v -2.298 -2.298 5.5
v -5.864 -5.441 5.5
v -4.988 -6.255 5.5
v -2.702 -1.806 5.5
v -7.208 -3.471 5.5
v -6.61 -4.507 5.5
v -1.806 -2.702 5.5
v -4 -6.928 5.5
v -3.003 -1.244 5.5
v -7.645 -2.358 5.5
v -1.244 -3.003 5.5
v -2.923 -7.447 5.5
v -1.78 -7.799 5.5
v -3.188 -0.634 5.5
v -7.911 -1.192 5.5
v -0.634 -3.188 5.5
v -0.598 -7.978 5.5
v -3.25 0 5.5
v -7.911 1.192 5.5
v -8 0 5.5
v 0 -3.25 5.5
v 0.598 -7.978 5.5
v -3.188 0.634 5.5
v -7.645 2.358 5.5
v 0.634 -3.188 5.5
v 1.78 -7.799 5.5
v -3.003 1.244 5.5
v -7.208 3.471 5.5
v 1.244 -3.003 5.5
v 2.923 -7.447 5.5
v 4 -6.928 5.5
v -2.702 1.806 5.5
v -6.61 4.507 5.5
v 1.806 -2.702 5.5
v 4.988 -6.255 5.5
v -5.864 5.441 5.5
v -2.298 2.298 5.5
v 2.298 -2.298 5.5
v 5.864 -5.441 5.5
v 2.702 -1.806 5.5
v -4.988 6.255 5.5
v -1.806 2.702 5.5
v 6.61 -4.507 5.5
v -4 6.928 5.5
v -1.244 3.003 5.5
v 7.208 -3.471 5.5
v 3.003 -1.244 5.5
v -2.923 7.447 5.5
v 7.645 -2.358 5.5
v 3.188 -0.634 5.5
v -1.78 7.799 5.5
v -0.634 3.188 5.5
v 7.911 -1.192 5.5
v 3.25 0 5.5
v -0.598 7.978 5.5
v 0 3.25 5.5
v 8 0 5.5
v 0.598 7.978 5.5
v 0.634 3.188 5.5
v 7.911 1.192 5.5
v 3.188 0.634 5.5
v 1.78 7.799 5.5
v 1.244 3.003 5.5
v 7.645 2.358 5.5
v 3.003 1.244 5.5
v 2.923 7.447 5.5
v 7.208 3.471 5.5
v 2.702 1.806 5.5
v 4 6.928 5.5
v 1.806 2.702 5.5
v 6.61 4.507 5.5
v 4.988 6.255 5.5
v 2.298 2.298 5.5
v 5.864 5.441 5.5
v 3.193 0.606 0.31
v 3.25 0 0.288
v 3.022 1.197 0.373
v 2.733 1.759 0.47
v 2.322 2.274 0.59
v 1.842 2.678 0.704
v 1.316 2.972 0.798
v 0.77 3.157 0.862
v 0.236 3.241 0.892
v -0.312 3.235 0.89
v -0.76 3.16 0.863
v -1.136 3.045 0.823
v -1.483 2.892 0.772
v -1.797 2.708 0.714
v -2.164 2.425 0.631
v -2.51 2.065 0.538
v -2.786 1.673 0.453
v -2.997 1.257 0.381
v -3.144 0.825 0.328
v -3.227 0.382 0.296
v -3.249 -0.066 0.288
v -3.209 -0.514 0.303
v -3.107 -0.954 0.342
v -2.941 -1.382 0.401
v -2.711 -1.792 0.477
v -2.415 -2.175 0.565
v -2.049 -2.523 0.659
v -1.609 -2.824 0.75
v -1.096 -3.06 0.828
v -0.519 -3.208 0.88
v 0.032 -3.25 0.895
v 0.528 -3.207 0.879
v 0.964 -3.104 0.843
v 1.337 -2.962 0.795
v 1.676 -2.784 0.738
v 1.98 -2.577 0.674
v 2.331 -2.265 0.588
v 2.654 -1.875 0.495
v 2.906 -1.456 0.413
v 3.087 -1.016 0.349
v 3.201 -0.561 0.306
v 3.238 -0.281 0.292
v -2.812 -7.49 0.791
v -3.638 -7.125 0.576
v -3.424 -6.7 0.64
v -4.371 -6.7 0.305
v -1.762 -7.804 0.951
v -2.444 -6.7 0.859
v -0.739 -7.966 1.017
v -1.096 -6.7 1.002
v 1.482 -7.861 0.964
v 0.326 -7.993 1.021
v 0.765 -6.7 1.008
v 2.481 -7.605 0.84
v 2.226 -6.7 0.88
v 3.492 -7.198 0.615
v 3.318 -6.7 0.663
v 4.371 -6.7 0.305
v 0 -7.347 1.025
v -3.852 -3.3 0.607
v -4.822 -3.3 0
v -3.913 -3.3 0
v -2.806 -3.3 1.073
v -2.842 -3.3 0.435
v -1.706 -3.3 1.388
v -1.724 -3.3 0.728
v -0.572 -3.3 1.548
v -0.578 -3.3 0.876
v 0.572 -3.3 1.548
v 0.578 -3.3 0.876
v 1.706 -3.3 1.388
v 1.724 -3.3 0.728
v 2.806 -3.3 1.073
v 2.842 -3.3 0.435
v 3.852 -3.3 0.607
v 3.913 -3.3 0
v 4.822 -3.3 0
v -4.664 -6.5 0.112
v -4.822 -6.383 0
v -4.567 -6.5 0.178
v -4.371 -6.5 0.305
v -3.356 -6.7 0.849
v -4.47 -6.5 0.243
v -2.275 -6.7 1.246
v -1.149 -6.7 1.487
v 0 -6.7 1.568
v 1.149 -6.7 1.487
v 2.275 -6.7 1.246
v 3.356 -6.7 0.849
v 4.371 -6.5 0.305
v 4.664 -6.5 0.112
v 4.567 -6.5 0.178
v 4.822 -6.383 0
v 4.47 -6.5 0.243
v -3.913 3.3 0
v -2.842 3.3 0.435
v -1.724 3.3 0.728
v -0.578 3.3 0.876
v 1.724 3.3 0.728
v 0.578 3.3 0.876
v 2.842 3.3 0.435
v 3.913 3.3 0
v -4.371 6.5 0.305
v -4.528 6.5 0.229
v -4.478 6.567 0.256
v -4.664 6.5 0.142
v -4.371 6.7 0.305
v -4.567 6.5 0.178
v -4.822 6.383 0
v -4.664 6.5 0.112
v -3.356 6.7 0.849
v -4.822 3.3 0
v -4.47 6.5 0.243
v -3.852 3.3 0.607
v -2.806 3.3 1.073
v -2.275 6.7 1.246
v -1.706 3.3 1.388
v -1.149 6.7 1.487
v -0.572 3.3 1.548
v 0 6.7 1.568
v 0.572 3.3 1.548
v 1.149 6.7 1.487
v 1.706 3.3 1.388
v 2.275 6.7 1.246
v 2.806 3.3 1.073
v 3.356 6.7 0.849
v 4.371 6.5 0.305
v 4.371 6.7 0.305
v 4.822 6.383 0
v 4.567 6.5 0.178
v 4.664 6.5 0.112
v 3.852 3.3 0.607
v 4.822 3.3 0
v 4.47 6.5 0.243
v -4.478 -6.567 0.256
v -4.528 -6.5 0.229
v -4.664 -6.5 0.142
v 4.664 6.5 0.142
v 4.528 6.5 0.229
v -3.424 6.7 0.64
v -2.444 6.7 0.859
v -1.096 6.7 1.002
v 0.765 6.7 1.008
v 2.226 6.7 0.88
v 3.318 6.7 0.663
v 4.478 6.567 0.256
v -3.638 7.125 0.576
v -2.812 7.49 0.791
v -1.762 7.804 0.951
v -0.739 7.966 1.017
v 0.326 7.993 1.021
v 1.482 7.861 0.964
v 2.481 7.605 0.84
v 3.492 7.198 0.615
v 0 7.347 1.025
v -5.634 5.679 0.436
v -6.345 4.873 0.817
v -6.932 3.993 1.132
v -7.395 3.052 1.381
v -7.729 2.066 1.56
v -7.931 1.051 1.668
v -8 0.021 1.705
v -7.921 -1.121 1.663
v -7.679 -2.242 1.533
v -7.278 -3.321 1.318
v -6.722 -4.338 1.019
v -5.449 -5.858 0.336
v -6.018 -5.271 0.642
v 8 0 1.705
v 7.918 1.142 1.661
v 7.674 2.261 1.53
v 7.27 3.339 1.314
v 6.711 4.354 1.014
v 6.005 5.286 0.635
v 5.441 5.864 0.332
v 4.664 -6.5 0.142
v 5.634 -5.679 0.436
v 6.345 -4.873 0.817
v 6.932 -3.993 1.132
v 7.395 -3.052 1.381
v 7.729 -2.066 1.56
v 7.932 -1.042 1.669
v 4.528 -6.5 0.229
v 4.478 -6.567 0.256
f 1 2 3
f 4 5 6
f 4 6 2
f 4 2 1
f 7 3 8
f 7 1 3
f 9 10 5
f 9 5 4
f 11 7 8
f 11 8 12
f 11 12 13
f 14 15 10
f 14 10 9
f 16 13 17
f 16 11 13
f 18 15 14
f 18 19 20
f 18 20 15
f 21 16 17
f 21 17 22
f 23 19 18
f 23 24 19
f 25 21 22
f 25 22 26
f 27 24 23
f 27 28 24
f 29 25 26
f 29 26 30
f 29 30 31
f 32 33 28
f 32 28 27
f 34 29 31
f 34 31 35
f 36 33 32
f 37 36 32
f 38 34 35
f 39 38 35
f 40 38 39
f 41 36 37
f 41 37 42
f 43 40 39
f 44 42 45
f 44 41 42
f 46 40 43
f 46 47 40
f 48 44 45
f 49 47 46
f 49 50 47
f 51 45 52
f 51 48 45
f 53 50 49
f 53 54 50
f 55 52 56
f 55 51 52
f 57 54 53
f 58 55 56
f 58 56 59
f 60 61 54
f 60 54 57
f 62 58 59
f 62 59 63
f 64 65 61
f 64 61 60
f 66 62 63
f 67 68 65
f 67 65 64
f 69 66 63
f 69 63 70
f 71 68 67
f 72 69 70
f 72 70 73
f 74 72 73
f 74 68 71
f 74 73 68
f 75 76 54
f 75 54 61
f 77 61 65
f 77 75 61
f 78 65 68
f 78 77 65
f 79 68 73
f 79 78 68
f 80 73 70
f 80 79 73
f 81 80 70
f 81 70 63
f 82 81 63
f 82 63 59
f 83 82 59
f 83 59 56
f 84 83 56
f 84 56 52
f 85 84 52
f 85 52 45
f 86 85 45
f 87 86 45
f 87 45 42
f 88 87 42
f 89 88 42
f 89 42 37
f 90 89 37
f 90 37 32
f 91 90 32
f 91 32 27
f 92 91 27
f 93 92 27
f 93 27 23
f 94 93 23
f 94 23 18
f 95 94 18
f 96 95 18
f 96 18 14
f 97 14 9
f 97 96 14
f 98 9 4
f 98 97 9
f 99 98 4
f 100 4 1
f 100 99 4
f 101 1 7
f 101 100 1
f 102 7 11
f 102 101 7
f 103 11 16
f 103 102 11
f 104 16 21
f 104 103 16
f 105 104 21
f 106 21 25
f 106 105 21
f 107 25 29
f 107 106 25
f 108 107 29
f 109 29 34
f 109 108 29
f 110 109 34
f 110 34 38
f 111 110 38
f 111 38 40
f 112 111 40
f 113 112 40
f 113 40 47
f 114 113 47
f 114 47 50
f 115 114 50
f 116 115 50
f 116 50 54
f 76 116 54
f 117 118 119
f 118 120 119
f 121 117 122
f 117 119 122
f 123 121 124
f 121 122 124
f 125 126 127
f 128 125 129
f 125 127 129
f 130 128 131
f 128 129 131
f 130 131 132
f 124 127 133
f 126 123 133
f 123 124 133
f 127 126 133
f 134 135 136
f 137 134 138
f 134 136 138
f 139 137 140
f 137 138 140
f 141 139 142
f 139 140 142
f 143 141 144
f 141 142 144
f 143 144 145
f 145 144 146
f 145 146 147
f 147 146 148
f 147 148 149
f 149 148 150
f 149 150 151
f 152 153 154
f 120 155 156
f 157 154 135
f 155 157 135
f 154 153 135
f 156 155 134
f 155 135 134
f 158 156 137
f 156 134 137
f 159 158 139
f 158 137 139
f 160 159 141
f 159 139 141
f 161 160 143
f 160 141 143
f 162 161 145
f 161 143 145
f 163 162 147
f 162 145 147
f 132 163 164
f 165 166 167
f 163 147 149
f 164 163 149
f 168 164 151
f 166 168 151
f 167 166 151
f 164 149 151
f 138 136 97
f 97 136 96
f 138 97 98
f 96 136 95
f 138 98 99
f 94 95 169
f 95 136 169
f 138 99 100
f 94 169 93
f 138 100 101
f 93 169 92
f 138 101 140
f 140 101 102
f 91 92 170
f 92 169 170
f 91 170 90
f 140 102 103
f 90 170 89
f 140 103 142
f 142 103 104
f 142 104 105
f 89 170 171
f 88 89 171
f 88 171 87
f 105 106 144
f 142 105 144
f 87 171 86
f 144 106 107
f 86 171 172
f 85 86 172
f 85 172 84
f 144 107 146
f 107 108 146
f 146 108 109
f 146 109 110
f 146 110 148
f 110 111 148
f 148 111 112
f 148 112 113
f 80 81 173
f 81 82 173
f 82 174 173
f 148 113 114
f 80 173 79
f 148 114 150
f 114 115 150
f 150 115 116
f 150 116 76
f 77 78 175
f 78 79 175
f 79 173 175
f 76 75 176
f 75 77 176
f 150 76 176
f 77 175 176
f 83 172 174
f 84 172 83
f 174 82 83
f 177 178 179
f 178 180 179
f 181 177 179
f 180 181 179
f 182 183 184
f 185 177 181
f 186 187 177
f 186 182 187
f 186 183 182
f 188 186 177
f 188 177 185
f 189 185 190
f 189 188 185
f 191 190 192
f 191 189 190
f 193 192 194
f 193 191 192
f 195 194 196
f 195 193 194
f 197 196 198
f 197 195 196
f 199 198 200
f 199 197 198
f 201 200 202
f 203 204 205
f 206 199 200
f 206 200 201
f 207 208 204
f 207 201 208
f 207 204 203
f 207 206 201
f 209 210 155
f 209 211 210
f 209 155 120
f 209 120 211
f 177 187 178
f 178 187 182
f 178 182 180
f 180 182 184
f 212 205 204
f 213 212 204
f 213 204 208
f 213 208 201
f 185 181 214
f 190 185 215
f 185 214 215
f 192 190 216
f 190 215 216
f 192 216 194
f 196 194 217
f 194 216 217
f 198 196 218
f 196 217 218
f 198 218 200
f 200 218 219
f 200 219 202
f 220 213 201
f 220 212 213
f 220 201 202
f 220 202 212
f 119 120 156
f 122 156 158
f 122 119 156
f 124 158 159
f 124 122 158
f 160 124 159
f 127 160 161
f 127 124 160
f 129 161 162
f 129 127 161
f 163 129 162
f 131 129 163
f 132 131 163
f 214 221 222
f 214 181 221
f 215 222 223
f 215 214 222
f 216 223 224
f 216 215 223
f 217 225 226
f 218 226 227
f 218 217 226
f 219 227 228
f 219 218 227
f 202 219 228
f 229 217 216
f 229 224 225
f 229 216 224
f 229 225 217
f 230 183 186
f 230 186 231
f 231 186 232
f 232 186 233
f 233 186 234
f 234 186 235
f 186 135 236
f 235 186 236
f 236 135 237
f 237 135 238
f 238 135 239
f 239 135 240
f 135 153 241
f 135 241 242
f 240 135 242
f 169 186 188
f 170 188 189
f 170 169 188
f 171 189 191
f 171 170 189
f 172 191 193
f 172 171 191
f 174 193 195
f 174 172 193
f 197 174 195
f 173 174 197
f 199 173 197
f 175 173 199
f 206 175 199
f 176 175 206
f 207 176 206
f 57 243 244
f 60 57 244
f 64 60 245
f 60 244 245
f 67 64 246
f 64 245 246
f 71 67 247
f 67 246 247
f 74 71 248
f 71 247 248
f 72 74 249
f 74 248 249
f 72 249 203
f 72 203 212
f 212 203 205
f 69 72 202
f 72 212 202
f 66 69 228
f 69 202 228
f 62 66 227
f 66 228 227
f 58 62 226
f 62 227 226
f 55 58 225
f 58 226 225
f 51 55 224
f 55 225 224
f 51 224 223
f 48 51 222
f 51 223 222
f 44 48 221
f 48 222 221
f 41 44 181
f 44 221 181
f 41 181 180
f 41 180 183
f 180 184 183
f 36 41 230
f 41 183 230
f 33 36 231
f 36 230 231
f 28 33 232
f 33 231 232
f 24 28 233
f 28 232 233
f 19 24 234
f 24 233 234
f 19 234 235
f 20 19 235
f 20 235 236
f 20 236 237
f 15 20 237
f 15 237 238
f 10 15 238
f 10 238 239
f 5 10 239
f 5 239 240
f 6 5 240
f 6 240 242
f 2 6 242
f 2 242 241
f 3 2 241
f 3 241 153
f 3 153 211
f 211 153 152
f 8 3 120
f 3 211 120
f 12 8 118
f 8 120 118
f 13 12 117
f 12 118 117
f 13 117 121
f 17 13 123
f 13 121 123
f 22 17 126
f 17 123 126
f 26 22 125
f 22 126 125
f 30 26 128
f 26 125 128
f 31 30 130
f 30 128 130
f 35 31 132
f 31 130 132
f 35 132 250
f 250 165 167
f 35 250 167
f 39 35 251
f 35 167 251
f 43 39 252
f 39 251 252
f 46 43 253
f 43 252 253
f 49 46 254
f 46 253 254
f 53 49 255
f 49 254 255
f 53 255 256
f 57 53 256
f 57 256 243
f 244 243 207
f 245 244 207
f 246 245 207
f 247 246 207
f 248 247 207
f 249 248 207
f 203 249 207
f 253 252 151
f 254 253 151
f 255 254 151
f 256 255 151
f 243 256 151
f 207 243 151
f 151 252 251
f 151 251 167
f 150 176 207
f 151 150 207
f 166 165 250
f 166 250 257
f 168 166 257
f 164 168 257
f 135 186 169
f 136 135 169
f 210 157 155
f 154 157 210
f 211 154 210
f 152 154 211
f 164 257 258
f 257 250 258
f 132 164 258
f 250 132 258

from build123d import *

# Parameters (mm, degrees)
CROQUIS1_R                 = 8
CROQUIS1_R_2               = 3.25
SALIENTE_EXTRUIR1_DEPTH    = 5.5
CORTAR_EXTRUIR1_START      = -3.2
CROQUIS3_R                 = 8.2
CORTAR_EXTRUIR1_DEPTH      = 3.4
CORTAR_EXTRUIR2_DEPTH      = 3.4
CORTAR_EXTRUIR3_REACH      = 16.898
CROQUIS5_R                 = 9
CORTAR_EXTRUIR4_DEPTH      = 13.579745796
CORTAR_EXTRUIR4_DEPTH_BACK = 13.579745796


with BuildPart() as part:
    # Croquis1 → Saliente-Extruir1 (new body)
    with BuildSketch(Plane.XY):
        Circle(CROQUIS1_R)
        Circle(CROQUIS1_R_2, mode=Mode.SUBTRACT)
    extrude(amount=SALIENTE_EXTRUIR1_DEPTH)

    # Croquis3 → Cortar-Extruir1 (cut)
    with BuildSketch(Plane(origin=(0, 6.5, 0), x_dir=(1, 0, 0), z_dir=(0, 1, 0)).offset(CORTAR_EXTRUIR1_START)):
        with Locations((0, 6.632138172)):
            Circle(CROQUIS3_R)
    cortar_extruir1 = extrude(amount=CORTAR_EXTRUIR1_DEPTH, mode=Mode.SUBTRACT)

    # Croquis4 → Cortar-Extruir2 (cut)
    with BuildSketch(Plane(origin=(0, 6.5, 0), x_dir=(1, 0, 0), z_dir=(0, 1, 0))):
        with BuildLine():
            Line((-4.82231721, 1.547107411), (4.82231721, 1.547107411))
            add(Edge.make_bspline(
                [(4.371498599, -0.305440656), (5.098983206, 0.005932333), (5.249256077, 0.623448355), (4.82231721, 1.547107411)],
                knots=[0, 0, 0, 0, 1, 1, 1, 1], degree=3))
            add(Edge.make_bspline(
                [(-4.371498599, -0.305440656), (-2.961142952, -0.90909144), (-0.0365681, -1.156703774), (3.034279152, -0.877788184), (4.371498599, -0.305440656)],
                knots=[0, 0, 0, 0, 0.5, 1, 1, 1, 1], degree=3))
            add(Edge.make_bspline(
                [(-4.371498599, -0.305440656), (-5.098983206, 0.005932333), (-5.249256077, 0.623448355), (-4.82231721, 1.547107411)],
                knots=[0, 0, 0, 0, 1, 1, 1, 1], degree=3))
        make_face()
    cortar_extruir2 = extrude(amount=CORTAR_EXTRUIR2_DEPTH, mode=Mode.SUBTRACT)

    # Simetría1: Cortar-Extruir1, Cortar-Extruir2 across plane
    add(cortar_extruir1.mirror(Plane.ZX), mode=Mode.SUBTRACT)
    add(cortar_extruir2.mirror(Plane.ZX), mode=Mode.SUBTRACT)

    # Cortar-Extruir3: up to this face of the body (flat: up to its plane)
    cortar_extruir3_end = Plane(part.part.faces().sort_by_distance((0, -3.3, 0.632585689))[0])
    # Croquis5 → Cortar-Extruir3 (cut, up to the picked face)
    with BuildSketch(Plane(origin=(0, 3.3, 0), x_dir=(1, 0, 0), z_dir=(0, 1, 0)), mode=Mode.PRIVATE) as cortar_extruir3_sk1:
        with Locations((0, 8.105012001)):
            Circle(CROQUIS5_R)
    cortar_extruir3_tool1 = split(extrude(cortar_extruir3_sk1.sketch, amount=-CORTAR_EXTRUIR3_REACH, mode=Mode.PRIVATE), bisect_by=cortar_extruir3_end, keep=Keep.BOTH, mode=Mode.PRIVATE)
    add(cortar_extruir3_tool1.solids().sort_by(Axis((0, 3.3, -8.105012), (0, -1, 0)))[0], mode=Mode.SUBTRACT)

    # Croquis6 → Cortar-Extruir4 (cut, two sides: drawn at the far end of the back side and taken through both)
    with BuildSketch(Plane(origin=(0, 0, 0), x_dir=(1, 0, 0), z_dir=(0, 1, 0)).offset(-CORTAR_EXTRUIR4_DEPTH_BACK)):
        Polygon((-4.82231721, 0), (-8.482103493, -1.964045705), (-8.482103493, 2.868930537), (8.482103493, 2.868930537), (8.482103493, -1.964045705), (4.82231721, 0), (4.82231721, 1.250339437), (-4.82231721, 1.250339437), align=None)
    extrude(amount=CORTAR_EXTRUIR4_DEPTH + CORTAR_EXTRUIR4_DEPTH_BACK, mode=Mode.SUBTRACT)


solid = part.part
